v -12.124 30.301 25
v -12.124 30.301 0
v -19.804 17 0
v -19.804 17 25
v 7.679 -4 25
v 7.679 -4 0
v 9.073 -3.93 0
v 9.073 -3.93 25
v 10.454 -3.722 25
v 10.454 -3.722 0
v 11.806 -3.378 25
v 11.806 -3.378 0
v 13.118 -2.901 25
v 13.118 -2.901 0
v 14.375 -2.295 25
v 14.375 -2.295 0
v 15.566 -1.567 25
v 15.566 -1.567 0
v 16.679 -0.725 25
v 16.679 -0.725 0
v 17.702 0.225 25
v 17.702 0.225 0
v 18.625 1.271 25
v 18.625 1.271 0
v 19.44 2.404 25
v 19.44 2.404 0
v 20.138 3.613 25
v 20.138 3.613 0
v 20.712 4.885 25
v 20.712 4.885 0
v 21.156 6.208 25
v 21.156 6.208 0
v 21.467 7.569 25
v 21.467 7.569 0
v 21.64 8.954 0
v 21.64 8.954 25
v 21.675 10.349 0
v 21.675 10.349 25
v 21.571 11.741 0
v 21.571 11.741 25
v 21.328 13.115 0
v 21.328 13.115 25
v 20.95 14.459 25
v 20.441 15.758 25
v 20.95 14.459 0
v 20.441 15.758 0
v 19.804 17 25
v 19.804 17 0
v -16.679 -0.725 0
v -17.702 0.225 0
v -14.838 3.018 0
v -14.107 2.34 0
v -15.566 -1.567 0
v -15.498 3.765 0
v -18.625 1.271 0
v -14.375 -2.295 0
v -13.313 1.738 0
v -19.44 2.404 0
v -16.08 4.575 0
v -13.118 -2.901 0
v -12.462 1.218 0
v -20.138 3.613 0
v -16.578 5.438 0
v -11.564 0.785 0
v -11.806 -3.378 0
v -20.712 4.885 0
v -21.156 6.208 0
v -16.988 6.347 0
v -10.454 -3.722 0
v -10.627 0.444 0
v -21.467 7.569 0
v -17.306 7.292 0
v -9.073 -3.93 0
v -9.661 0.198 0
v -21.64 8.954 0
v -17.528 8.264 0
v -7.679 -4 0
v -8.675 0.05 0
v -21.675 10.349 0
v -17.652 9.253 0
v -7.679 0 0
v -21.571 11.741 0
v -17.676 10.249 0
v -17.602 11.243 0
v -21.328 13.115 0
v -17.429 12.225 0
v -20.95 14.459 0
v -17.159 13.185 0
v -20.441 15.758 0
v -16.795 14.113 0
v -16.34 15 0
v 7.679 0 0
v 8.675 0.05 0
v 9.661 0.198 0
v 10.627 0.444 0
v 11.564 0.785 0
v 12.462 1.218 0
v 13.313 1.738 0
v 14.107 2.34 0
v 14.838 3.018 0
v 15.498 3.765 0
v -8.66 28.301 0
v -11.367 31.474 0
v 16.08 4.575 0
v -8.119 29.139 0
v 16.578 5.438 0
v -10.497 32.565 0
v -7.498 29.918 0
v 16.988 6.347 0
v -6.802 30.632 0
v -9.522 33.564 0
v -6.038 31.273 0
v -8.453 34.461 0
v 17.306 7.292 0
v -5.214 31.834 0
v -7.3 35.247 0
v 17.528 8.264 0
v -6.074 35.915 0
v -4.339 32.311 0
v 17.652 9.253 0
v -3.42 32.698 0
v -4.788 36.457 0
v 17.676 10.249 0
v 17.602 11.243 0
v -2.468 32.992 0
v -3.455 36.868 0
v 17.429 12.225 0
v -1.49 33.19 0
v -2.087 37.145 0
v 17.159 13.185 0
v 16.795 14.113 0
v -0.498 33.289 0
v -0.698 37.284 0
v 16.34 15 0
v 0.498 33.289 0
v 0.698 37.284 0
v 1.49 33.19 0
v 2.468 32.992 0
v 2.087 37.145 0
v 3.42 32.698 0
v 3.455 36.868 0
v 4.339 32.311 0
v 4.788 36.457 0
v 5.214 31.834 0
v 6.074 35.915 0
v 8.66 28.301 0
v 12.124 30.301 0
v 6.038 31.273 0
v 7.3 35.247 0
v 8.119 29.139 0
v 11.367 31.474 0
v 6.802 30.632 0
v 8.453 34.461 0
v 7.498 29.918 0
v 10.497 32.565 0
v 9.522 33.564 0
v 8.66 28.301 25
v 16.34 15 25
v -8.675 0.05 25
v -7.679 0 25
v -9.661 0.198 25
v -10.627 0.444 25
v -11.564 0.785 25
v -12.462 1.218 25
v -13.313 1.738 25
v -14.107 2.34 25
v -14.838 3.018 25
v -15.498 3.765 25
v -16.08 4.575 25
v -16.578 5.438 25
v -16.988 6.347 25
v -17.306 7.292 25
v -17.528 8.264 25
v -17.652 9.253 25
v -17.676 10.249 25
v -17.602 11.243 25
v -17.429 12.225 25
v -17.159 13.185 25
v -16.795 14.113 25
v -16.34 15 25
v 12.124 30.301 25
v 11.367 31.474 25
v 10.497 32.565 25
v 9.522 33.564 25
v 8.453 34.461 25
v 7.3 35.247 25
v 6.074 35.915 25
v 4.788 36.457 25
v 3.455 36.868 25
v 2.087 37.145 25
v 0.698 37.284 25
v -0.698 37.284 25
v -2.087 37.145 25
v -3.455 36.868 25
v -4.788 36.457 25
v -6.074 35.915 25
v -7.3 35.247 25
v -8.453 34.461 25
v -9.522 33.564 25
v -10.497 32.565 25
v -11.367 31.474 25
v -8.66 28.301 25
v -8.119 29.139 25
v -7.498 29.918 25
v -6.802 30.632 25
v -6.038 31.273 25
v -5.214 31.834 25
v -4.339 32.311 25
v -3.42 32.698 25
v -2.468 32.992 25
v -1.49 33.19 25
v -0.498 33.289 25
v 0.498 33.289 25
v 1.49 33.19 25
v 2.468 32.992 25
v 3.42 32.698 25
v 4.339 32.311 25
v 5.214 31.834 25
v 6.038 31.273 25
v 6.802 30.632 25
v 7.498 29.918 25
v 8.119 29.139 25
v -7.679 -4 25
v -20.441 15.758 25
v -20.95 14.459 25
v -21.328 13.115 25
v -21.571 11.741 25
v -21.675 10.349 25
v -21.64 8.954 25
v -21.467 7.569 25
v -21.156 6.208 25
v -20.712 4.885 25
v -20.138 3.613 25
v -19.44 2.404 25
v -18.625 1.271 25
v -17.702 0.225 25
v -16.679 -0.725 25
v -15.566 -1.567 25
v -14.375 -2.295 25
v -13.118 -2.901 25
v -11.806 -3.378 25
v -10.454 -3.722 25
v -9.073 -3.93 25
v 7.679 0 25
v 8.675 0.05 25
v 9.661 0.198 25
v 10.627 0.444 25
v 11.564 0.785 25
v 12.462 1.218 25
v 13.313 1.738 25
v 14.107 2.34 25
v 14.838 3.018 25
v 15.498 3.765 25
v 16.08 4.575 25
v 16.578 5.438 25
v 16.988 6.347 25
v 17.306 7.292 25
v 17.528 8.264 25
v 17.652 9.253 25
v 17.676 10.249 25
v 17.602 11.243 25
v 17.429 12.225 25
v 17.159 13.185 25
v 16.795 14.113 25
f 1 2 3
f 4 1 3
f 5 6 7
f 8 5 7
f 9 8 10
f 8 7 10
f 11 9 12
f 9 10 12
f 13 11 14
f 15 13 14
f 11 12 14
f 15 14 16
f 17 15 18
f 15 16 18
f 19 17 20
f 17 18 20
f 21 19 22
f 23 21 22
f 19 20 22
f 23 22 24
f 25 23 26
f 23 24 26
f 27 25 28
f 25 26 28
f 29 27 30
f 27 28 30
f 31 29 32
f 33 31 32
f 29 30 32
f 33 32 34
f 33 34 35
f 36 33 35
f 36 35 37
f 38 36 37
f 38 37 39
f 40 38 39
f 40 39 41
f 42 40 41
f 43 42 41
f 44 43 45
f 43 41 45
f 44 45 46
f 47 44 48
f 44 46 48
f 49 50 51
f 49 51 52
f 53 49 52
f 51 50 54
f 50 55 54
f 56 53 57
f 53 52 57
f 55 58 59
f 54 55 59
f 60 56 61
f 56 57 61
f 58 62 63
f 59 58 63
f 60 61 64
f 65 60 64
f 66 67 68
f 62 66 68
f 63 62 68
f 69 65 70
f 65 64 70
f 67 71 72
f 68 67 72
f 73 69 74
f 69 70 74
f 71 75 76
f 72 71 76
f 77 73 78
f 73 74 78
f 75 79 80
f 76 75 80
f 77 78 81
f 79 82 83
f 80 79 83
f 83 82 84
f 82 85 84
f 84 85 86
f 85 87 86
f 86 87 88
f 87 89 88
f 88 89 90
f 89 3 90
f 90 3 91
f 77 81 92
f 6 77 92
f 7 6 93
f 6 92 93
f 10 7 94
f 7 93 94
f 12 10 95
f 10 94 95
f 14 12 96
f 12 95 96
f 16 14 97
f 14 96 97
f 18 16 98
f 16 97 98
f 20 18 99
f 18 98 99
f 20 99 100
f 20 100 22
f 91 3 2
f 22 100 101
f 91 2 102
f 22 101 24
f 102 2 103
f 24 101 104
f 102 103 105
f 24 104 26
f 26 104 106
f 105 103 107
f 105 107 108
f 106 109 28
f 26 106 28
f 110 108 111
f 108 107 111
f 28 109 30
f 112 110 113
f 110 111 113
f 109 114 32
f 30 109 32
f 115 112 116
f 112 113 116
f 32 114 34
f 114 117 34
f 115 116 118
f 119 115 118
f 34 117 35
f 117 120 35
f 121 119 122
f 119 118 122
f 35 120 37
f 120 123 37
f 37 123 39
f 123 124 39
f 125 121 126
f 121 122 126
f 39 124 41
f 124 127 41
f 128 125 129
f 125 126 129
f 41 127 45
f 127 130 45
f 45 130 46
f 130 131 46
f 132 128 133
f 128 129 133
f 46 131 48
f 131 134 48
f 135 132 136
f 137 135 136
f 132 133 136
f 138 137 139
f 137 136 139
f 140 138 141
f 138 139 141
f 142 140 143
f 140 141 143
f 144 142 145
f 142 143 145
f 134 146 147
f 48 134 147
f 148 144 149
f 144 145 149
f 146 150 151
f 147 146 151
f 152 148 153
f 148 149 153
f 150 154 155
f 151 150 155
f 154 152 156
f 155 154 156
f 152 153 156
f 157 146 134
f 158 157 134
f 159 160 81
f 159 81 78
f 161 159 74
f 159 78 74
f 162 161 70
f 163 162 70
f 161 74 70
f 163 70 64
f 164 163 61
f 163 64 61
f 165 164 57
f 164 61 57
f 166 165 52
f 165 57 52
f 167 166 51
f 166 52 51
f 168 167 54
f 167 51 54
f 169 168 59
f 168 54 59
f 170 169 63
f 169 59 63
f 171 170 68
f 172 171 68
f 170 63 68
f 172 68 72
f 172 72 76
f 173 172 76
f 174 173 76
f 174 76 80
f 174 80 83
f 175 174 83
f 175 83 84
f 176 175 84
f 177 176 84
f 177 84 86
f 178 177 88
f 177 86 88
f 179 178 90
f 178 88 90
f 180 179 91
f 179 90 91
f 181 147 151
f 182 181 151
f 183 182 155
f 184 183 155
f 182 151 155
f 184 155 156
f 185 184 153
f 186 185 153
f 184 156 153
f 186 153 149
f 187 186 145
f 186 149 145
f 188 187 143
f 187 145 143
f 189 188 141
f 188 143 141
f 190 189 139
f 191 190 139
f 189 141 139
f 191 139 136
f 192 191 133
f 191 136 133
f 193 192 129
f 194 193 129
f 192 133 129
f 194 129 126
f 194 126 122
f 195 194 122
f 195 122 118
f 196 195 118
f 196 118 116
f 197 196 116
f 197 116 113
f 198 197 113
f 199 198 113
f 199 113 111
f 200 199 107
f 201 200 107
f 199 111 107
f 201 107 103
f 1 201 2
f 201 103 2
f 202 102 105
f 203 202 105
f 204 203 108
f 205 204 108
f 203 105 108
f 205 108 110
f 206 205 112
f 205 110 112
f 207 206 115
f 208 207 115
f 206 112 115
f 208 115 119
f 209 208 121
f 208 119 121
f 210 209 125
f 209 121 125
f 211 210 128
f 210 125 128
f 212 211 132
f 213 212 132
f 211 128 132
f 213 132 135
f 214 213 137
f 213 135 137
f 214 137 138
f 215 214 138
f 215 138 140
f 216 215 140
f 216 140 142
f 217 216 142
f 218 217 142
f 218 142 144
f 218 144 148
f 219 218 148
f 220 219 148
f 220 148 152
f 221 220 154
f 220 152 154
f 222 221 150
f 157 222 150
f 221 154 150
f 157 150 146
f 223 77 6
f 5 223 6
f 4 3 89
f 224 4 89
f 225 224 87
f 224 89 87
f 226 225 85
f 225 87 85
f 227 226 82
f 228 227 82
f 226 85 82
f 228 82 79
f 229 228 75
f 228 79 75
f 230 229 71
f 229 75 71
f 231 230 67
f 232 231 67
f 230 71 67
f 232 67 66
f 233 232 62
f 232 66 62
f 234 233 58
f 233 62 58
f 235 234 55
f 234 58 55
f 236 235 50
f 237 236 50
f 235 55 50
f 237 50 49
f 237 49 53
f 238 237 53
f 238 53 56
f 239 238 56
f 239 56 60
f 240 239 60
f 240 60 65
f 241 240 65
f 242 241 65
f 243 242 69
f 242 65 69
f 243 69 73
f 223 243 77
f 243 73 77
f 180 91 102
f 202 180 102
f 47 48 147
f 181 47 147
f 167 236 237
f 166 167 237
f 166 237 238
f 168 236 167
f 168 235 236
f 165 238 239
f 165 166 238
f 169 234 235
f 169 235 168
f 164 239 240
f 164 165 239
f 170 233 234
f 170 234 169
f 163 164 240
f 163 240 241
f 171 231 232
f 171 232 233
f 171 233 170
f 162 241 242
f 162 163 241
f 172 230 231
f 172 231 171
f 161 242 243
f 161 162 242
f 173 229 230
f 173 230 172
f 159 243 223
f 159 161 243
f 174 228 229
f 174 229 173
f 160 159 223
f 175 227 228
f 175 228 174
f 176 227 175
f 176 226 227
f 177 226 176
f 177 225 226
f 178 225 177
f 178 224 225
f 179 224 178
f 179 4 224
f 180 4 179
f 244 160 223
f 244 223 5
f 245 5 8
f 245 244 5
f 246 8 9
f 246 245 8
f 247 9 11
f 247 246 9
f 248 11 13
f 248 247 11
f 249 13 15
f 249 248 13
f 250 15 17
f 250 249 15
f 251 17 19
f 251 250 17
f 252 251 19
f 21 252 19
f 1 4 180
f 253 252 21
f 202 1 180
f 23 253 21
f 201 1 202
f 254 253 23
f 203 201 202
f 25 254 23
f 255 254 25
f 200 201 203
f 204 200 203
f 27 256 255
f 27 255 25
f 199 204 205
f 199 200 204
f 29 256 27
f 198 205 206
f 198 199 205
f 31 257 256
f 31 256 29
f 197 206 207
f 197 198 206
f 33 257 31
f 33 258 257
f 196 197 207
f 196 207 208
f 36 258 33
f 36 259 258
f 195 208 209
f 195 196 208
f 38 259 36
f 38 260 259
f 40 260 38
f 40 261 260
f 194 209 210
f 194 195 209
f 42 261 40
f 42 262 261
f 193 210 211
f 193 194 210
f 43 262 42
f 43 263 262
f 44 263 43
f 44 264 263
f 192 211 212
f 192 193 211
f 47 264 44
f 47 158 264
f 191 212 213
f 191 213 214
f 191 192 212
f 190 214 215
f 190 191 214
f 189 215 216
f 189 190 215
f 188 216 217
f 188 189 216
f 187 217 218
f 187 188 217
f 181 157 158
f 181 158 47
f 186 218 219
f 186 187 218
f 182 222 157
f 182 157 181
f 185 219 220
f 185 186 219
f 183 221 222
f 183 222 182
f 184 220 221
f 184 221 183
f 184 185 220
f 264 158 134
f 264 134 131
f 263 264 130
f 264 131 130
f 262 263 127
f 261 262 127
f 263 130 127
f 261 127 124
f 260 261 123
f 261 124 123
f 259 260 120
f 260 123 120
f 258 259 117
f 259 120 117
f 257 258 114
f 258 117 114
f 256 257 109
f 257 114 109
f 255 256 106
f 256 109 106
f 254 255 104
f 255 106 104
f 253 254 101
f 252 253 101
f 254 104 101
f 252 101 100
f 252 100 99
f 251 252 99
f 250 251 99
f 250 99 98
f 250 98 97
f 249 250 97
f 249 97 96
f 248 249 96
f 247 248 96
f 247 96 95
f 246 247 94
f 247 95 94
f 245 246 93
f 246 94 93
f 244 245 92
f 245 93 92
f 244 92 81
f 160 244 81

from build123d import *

# Parameters (mm, degrees)
F1_DEPTH = 25


with BuildPart() as f1:
    # F0 (on Top) → F1 (new body)
    with BuildSketch(Plane.XY):
        with BuildLine():
            ThreePointArc((7.679492, -4), (19.803848, 3), (19.803848, 17))
            Line((19.803848, 17), (12.124356, 30.30127))
            ThreePointArc((12.124356, 30.30127), (0, 37.30127), (-12.124356, 30.30127))
            Line((-12.124356, 30.30127), (-19.803848, 17))
            ThreePointArc((-19.803848, 17), (-19.803848, 3), (-7.679492, -4))
            Line((-7.679492, -4), (0, -4))
            Line((0, -4), (7.679492, -4))
        make_face()
        with BuildLine():
            Line((7.679492, 0), (0, 0))
            Line((0, 0), (-7.679492, 0))
            ThreePointArc((-7.679492, 0), (-16.339746, 5), (-16.339746, 15))
            Line((-16.339746, 15), (-8.660254, 28.30127))
            ThreePointArc((-8.660254, 28.30127), (0, 33.30127), (8.660254, 28.30127))
            Line((8.660254, 28.30127), (16.339746, 15))
            ThreePointArc((16.339746, 15), (16.339746, 5), (7.679492, 0))
        make_face(mode=Mode.SUBTRACT)
    extrude(amount=F1_DEPTH)


solid = f1.part
